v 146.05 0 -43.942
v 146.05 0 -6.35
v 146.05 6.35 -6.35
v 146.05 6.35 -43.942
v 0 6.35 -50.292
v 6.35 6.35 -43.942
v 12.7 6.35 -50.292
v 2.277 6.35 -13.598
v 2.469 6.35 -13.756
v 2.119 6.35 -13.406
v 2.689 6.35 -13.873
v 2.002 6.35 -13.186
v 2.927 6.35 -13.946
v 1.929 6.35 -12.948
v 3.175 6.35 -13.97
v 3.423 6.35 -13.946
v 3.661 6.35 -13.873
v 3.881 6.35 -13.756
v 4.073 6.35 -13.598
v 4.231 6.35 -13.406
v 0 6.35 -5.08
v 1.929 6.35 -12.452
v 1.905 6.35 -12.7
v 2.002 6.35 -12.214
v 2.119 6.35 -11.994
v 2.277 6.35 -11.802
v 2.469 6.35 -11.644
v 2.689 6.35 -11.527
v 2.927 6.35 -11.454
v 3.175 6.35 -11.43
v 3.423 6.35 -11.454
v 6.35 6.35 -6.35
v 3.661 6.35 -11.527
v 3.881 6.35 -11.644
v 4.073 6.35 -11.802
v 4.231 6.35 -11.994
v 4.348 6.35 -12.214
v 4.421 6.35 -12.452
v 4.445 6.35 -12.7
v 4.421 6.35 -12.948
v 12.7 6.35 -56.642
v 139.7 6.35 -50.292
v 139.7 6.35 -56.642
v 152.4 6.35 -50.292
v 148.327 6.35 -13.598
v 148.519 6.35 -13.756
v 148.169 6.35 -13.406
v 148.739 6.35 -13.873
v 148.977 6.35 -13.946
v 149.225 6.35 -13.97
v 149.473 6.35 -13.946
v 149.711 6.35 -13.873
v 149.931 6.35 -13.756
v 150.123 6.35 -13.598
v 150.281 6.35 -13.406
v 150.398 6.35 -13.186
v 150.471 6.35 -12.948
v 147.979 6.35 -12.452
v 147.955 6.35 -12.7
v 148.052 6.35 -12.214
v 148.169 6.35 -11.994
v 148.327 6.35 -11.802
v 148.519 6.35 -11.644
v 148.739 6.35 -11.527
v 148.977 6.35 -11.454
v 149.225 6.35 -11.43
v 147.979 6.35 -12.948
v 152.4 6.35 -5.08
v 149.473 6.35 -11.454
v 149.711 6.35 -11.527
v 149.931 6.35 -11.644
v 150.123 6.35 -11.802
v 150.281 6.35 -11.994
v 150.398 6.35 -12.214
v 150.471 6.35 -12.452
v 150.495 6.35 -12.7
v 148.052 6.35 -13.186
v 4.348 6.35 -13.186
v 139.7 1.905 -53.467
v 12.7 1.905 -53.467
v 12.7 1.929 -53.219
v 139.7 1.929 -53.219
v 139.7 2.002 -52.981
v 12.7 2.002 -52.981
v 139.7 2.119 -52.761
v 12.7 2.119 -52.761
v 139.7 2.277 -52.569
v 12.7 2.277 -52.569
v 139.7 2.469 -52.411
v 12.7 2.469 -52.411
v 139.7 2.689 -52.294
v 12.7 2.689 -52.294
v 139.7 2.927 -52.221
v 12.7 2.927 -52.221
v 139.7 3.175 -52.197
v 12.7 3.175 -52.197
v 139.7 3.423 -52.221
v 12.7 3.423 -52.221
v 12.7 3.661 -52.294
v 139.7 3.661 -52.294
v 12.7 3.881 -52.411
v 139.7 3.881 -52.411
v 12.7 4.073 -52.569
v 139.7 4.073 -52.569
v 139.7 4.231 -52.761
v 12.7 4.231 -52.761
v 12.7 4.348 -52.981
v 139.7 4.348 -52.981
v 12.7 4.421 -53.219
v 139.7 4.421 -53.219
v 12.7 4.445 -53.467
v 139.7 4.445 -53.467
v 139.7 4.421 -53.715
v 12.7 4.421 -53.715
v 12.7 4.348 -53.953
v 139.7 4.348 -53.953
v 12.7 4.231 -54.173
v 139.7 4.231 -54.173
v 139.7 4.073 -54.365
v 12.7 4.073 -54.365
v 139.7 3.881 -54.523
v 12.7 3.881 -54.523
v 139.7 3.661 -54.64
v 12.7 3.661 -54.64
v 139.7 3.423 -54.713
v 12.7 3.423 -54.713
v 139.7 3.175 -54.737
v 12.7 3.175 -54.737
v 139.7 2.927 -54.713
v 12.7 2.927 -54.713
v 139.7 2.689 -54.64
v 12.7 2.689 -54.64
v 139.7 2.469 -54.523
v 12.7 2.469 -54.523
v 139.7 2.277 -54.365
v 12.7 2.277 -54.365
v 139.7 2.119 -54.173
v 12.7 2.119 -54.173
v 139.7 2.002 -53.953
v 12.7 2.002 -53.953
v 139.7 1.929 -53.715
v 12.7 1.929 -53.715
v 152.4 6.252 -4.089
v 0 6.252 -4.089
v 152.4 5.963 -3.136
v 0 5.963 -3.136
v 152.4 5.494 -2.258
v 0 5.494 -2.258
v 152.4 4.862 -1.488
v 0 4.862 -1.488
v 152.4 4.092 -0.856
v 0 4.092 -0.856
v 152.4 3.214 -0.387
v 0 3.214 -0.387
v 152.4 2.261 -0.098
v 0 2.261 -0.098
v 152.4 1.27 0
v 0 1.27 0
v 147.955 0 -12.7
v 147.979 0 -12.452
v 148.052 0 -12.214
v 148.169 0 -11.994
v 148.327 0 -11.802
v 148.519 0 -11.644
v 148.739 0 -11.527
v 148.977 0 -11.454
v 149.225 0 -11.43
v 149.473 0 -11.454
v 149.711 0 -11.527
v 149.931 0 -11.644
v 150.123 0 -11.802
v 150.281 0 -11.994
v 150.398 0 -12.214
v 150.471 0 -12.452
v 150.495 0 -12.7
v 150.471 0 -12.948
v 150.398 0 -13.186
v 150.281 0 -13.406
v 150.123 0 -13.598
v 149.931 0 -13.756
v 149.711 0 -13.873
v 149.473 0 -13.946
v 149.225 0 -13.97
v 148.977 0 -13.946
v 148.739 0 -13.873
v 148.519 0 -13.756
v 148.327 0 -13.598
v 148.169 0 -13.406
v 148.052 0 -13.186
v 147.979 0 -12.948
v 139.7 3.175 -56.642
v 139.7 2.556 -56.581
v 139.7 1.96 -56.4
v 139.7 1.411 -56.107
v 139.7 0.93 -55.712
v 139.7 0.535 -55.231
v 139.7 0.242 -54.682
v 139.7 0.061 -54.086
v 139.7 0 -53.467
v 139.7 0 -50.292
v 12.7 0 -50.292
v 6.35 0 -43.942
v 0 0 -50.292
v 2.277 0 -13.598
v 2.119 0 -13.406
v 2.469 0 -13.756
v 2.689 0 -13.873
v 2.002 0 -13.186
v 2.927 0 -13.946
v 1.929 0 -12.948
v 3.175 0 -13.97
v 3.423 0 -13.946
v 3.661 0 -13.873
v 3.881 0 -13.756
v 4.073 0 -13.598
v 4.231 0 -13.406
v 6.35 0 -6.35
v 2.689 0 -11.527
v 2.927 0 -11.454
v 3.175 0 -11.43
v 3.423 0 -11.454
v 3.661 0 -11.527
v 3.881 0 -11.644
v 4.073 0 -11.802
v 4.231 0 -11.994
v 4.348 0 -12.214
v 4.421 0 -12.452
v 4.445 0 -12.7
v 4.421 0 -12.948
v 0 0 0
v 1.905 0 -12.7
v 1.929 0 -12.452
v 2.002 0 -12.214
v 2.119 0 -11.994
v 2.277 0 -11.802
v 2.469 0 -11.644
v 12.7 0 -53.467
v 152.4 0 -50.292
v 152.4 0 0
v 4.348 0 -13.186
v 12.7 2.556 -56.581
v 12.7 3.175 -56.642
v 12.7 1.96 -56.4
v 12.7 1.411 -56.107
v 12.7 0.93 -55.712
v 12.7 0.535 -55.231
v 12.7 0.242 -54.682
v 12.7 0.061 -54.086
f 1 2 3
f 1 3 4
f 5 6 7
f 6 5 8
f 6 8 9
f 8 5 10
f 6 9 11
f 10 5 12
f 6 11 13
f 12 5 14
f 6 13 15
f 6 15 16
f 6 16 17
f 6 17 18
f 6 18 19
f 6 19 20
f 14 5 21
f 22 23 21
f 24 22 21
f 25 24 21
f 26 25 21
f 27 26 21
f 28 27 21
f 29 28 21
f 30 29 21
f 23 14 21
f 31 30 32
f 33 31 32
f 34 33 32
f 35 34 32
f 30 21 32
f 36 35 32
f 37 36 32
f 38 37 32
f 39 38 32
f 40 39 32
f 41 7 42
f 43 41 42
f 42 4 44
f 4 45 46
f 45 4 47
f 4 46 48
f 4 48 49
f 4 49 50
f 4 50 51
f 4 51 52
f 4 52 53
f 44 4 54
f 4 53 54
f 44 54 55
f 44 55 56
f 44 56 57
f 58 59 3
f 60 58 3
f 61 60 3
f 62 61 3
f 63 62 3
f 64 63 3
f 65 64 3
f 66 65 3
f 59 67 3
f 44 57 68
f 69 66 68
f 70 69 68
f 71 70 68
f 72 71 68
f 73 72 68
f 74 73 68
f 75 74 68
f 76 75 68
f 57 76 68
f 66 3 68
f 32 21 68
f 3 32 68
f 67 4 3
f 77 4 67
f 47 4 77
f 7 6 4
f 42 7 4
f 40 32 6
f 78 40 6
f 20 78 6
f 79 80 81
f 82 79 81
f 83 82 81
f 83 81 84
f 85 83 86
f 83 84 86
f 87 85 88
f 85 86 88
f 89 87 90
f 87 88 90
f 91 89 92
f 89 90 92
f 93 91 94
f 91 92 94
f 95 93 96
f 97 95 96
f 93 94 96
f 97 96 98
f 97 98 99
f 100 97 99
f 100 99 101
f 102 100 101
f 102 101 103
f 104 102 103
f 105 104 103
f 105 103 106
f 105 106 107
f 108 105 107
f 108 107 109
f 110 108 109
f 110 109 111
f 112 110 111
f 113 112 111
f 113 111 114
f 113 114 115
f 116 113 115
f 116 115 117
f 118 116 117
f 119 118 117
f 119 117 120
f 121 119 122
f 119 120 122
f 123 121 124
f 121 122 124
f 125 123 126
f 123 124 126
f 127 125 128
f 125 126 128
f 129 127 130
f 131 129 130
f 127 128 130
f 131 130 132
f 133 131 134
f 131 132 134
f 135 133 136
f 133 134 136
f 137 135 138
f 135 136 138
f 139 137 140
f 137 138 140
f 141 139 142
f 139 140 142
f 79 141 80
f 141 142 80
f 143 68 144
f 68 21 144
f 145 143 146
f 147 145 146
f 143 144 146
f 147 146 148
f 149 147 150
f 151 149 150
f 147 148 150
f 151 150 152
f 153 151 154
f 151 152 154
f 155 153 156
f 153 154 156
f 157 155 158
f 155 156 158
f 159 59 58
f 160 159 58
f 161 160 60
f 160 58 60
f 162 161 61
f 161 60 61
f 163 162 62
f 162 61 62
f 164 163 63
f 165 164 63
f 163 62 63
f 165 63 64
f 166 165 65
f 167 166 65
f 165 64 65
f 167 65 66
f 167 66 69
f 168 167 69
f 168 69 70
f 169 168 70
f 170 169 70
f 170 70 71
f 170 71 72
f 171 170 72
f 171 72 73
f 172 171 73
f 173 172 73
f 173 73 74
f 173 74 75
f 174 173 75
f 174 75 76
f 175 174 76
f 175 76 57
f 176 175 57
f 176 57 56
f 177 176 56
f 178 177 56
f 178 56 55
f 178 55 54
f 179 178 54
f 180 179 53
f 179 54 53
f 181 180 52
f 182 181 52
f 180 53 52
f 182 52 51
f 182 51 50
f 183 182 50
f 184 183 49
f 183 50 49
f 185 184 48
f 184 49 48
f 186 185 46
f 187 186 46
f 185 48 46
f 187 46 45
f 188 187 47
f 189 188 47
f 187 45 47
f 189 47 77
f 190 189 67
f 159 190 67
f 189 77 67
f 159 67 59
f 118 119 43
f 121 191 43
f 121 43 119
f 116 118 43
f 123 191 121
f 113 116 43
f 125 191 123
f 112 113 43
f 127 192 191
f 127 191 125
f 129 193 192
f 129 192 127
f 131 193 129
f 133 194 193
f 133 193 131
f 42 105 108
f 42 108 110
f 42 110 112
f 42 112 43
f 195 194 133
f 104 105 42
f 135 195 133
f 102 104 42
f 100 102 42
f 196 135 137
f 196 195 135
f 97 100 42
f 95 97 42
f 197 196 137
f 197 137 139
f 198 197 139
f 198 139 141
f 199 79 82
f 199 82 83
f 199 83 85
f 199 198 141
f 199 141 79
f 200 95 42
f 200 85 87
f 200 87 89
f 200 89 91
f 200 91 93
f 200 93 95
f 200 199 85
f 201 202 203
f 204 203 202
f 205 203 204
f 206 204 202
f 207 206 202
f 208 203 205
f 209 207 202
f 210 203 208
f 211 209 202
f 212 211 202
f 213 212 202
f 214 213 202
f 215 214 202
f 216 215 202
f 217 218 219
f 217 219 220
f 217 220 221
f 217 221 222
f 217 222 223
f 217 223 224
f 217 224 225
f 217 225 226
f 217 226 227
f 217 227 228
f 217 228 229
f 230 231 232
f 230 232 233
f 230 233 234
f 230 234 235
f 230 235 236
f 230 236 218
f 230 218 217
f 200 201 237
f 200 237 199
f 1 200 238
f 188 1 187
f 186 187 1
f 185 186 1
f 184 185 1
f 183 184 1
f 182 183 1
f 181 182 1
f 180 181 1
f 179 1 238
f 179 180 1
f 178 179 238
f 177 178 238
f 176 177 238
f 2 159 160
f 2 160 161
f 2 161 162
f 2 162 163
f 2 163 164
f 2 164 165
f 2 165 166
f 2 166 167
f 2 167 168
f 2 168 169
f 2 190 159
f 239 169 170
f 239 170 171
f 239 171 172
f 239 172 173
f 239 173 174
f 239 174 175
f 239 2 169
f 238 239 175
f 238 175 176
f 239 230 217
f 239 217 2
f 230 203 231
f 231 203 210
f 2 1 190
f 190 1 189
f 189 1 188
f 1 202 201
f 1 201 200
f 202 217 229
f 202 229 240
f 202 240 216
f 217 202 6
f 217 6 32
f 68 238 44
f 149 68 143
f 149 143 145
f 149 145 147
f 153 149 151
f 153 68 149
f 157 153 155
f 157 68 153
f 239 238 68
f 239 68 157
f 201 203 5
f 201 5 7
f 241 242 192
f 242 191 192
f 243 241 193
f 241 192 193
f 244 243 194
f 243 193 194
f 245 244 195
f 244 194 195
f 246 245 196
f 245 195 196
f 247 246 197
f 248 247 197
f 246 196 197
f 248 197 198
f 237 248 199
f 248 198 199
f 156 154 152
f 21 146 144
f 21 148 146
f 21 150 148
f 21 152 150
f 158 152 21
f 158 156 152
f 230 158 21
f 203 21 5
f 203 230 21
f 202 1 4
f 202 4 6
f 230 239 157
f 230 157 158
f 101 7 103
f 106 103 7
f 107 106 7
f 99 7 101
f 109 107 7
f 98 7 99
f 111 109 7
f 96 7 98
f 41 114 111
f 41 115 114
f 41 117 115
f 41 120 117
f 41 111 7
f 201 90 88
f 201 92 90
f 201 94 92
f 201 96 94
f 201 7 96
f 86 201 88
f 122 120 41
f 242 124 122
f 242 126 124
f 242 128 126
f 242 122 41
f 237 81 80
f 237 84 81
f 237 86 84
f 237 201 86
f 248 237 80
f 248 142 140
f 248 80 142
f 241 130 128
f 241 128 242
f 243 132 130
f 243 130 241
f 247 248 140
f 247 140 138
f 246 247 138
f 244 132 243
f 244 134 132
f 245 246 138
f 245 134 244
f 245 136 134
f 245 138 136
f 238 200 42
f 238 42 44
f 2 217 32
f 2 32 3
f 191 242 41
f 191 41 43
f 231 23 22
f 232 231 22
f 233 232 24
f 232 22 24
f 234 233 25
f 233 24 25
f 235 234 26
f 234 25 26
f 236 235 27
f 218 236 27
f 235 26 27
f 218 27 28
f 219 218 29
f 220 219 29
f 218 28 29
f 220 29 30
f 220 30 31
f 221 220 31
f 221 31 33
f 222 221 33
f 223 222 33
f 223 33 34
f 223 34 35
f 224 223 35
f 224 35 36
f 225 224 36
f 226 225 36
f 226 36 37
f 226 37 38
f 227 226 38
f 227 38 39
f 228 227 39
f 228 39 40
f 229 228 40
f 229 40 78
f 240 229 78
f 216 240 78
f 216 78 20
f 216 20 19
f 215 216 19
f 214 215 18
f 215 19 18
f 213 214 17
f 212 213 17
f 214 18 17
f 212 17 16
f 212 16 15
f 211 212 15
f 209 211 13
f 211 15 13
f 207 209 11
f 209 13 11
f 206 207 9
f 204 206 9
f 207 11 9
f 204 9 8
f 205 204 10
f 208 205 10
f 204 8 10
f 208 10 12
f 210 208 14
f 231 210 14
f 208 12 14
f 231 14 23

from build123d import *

# Parameters (mm, degrees)
F1_DEPTH = 6.35
F2_R     = 3.175
F3_R     = 1.27
F4_DEPTH = 139.701
F5_R     = 5.08
F6_R     = 1.27
F7_DEPTH = 6.351


with BuildPart() as f1:
    # F0 (on Front) → F1 (new body)
    with BuildSketch(Plane.XZ):
        Polygon((152.4, 0), (0, 0), (0, -50.292001), (12.7, -50.292001), (12.7, -56.642), (139.7, -56.642), (139.7, -50.292001), (152.4, -50.292001), align=None)
        Polygon((146.05, -6.35), (146.05, -43.942001), (139.7, -43.942001), (12.7, -43.942001), (6.35, -43.942001), (6.35, -6.35), align=None, mode=Mode.SUBTRACT)
    extrude(amount=-F1_DEPTH)

    # F2
    f2_edges = [f1.edges().sort_by_distance(p)[0] for p in [
        (76.2, 0, -56.642),
    ]]
    fillet(f2_edges, radius=F2_R)

    # F3 (on face) → F4 (cut, through all)
    with BuildSketch(Plane(origin=(12.7, 0, 0), x_dir=(0, -1, 0), z_dir=(-1, 0, 0))):
        with Locations((-3.175, -53.467)):
            Circle(F3_R)
    extrude(amount=-F4_DEPTH, mode=Mode.SUBTRACT)

    # F5
    f5_edges = [f1.edges().sort_by_distance(p)[0] for p in [
        (76.2, 6.35, 0),
    ]]
    fillet(f5_edges, radius=F5_R)

    # F6 (on face) → F7 (cut, through all)
    with BuildSketch(Plane(origin=(0, 6.35, 0), x_dir=(-1, 0, 0), z_dir=(0, 1, 0))):
        with Locations((-149.225, -12.7)):
            Circle(F6_R)
        with Locations((-3.175, -12.7)):
            Circle(F6_R)
    extrude(amount=-F7_DEPTH, mode=Mode.SUBTRACT)


solid = f1.part
